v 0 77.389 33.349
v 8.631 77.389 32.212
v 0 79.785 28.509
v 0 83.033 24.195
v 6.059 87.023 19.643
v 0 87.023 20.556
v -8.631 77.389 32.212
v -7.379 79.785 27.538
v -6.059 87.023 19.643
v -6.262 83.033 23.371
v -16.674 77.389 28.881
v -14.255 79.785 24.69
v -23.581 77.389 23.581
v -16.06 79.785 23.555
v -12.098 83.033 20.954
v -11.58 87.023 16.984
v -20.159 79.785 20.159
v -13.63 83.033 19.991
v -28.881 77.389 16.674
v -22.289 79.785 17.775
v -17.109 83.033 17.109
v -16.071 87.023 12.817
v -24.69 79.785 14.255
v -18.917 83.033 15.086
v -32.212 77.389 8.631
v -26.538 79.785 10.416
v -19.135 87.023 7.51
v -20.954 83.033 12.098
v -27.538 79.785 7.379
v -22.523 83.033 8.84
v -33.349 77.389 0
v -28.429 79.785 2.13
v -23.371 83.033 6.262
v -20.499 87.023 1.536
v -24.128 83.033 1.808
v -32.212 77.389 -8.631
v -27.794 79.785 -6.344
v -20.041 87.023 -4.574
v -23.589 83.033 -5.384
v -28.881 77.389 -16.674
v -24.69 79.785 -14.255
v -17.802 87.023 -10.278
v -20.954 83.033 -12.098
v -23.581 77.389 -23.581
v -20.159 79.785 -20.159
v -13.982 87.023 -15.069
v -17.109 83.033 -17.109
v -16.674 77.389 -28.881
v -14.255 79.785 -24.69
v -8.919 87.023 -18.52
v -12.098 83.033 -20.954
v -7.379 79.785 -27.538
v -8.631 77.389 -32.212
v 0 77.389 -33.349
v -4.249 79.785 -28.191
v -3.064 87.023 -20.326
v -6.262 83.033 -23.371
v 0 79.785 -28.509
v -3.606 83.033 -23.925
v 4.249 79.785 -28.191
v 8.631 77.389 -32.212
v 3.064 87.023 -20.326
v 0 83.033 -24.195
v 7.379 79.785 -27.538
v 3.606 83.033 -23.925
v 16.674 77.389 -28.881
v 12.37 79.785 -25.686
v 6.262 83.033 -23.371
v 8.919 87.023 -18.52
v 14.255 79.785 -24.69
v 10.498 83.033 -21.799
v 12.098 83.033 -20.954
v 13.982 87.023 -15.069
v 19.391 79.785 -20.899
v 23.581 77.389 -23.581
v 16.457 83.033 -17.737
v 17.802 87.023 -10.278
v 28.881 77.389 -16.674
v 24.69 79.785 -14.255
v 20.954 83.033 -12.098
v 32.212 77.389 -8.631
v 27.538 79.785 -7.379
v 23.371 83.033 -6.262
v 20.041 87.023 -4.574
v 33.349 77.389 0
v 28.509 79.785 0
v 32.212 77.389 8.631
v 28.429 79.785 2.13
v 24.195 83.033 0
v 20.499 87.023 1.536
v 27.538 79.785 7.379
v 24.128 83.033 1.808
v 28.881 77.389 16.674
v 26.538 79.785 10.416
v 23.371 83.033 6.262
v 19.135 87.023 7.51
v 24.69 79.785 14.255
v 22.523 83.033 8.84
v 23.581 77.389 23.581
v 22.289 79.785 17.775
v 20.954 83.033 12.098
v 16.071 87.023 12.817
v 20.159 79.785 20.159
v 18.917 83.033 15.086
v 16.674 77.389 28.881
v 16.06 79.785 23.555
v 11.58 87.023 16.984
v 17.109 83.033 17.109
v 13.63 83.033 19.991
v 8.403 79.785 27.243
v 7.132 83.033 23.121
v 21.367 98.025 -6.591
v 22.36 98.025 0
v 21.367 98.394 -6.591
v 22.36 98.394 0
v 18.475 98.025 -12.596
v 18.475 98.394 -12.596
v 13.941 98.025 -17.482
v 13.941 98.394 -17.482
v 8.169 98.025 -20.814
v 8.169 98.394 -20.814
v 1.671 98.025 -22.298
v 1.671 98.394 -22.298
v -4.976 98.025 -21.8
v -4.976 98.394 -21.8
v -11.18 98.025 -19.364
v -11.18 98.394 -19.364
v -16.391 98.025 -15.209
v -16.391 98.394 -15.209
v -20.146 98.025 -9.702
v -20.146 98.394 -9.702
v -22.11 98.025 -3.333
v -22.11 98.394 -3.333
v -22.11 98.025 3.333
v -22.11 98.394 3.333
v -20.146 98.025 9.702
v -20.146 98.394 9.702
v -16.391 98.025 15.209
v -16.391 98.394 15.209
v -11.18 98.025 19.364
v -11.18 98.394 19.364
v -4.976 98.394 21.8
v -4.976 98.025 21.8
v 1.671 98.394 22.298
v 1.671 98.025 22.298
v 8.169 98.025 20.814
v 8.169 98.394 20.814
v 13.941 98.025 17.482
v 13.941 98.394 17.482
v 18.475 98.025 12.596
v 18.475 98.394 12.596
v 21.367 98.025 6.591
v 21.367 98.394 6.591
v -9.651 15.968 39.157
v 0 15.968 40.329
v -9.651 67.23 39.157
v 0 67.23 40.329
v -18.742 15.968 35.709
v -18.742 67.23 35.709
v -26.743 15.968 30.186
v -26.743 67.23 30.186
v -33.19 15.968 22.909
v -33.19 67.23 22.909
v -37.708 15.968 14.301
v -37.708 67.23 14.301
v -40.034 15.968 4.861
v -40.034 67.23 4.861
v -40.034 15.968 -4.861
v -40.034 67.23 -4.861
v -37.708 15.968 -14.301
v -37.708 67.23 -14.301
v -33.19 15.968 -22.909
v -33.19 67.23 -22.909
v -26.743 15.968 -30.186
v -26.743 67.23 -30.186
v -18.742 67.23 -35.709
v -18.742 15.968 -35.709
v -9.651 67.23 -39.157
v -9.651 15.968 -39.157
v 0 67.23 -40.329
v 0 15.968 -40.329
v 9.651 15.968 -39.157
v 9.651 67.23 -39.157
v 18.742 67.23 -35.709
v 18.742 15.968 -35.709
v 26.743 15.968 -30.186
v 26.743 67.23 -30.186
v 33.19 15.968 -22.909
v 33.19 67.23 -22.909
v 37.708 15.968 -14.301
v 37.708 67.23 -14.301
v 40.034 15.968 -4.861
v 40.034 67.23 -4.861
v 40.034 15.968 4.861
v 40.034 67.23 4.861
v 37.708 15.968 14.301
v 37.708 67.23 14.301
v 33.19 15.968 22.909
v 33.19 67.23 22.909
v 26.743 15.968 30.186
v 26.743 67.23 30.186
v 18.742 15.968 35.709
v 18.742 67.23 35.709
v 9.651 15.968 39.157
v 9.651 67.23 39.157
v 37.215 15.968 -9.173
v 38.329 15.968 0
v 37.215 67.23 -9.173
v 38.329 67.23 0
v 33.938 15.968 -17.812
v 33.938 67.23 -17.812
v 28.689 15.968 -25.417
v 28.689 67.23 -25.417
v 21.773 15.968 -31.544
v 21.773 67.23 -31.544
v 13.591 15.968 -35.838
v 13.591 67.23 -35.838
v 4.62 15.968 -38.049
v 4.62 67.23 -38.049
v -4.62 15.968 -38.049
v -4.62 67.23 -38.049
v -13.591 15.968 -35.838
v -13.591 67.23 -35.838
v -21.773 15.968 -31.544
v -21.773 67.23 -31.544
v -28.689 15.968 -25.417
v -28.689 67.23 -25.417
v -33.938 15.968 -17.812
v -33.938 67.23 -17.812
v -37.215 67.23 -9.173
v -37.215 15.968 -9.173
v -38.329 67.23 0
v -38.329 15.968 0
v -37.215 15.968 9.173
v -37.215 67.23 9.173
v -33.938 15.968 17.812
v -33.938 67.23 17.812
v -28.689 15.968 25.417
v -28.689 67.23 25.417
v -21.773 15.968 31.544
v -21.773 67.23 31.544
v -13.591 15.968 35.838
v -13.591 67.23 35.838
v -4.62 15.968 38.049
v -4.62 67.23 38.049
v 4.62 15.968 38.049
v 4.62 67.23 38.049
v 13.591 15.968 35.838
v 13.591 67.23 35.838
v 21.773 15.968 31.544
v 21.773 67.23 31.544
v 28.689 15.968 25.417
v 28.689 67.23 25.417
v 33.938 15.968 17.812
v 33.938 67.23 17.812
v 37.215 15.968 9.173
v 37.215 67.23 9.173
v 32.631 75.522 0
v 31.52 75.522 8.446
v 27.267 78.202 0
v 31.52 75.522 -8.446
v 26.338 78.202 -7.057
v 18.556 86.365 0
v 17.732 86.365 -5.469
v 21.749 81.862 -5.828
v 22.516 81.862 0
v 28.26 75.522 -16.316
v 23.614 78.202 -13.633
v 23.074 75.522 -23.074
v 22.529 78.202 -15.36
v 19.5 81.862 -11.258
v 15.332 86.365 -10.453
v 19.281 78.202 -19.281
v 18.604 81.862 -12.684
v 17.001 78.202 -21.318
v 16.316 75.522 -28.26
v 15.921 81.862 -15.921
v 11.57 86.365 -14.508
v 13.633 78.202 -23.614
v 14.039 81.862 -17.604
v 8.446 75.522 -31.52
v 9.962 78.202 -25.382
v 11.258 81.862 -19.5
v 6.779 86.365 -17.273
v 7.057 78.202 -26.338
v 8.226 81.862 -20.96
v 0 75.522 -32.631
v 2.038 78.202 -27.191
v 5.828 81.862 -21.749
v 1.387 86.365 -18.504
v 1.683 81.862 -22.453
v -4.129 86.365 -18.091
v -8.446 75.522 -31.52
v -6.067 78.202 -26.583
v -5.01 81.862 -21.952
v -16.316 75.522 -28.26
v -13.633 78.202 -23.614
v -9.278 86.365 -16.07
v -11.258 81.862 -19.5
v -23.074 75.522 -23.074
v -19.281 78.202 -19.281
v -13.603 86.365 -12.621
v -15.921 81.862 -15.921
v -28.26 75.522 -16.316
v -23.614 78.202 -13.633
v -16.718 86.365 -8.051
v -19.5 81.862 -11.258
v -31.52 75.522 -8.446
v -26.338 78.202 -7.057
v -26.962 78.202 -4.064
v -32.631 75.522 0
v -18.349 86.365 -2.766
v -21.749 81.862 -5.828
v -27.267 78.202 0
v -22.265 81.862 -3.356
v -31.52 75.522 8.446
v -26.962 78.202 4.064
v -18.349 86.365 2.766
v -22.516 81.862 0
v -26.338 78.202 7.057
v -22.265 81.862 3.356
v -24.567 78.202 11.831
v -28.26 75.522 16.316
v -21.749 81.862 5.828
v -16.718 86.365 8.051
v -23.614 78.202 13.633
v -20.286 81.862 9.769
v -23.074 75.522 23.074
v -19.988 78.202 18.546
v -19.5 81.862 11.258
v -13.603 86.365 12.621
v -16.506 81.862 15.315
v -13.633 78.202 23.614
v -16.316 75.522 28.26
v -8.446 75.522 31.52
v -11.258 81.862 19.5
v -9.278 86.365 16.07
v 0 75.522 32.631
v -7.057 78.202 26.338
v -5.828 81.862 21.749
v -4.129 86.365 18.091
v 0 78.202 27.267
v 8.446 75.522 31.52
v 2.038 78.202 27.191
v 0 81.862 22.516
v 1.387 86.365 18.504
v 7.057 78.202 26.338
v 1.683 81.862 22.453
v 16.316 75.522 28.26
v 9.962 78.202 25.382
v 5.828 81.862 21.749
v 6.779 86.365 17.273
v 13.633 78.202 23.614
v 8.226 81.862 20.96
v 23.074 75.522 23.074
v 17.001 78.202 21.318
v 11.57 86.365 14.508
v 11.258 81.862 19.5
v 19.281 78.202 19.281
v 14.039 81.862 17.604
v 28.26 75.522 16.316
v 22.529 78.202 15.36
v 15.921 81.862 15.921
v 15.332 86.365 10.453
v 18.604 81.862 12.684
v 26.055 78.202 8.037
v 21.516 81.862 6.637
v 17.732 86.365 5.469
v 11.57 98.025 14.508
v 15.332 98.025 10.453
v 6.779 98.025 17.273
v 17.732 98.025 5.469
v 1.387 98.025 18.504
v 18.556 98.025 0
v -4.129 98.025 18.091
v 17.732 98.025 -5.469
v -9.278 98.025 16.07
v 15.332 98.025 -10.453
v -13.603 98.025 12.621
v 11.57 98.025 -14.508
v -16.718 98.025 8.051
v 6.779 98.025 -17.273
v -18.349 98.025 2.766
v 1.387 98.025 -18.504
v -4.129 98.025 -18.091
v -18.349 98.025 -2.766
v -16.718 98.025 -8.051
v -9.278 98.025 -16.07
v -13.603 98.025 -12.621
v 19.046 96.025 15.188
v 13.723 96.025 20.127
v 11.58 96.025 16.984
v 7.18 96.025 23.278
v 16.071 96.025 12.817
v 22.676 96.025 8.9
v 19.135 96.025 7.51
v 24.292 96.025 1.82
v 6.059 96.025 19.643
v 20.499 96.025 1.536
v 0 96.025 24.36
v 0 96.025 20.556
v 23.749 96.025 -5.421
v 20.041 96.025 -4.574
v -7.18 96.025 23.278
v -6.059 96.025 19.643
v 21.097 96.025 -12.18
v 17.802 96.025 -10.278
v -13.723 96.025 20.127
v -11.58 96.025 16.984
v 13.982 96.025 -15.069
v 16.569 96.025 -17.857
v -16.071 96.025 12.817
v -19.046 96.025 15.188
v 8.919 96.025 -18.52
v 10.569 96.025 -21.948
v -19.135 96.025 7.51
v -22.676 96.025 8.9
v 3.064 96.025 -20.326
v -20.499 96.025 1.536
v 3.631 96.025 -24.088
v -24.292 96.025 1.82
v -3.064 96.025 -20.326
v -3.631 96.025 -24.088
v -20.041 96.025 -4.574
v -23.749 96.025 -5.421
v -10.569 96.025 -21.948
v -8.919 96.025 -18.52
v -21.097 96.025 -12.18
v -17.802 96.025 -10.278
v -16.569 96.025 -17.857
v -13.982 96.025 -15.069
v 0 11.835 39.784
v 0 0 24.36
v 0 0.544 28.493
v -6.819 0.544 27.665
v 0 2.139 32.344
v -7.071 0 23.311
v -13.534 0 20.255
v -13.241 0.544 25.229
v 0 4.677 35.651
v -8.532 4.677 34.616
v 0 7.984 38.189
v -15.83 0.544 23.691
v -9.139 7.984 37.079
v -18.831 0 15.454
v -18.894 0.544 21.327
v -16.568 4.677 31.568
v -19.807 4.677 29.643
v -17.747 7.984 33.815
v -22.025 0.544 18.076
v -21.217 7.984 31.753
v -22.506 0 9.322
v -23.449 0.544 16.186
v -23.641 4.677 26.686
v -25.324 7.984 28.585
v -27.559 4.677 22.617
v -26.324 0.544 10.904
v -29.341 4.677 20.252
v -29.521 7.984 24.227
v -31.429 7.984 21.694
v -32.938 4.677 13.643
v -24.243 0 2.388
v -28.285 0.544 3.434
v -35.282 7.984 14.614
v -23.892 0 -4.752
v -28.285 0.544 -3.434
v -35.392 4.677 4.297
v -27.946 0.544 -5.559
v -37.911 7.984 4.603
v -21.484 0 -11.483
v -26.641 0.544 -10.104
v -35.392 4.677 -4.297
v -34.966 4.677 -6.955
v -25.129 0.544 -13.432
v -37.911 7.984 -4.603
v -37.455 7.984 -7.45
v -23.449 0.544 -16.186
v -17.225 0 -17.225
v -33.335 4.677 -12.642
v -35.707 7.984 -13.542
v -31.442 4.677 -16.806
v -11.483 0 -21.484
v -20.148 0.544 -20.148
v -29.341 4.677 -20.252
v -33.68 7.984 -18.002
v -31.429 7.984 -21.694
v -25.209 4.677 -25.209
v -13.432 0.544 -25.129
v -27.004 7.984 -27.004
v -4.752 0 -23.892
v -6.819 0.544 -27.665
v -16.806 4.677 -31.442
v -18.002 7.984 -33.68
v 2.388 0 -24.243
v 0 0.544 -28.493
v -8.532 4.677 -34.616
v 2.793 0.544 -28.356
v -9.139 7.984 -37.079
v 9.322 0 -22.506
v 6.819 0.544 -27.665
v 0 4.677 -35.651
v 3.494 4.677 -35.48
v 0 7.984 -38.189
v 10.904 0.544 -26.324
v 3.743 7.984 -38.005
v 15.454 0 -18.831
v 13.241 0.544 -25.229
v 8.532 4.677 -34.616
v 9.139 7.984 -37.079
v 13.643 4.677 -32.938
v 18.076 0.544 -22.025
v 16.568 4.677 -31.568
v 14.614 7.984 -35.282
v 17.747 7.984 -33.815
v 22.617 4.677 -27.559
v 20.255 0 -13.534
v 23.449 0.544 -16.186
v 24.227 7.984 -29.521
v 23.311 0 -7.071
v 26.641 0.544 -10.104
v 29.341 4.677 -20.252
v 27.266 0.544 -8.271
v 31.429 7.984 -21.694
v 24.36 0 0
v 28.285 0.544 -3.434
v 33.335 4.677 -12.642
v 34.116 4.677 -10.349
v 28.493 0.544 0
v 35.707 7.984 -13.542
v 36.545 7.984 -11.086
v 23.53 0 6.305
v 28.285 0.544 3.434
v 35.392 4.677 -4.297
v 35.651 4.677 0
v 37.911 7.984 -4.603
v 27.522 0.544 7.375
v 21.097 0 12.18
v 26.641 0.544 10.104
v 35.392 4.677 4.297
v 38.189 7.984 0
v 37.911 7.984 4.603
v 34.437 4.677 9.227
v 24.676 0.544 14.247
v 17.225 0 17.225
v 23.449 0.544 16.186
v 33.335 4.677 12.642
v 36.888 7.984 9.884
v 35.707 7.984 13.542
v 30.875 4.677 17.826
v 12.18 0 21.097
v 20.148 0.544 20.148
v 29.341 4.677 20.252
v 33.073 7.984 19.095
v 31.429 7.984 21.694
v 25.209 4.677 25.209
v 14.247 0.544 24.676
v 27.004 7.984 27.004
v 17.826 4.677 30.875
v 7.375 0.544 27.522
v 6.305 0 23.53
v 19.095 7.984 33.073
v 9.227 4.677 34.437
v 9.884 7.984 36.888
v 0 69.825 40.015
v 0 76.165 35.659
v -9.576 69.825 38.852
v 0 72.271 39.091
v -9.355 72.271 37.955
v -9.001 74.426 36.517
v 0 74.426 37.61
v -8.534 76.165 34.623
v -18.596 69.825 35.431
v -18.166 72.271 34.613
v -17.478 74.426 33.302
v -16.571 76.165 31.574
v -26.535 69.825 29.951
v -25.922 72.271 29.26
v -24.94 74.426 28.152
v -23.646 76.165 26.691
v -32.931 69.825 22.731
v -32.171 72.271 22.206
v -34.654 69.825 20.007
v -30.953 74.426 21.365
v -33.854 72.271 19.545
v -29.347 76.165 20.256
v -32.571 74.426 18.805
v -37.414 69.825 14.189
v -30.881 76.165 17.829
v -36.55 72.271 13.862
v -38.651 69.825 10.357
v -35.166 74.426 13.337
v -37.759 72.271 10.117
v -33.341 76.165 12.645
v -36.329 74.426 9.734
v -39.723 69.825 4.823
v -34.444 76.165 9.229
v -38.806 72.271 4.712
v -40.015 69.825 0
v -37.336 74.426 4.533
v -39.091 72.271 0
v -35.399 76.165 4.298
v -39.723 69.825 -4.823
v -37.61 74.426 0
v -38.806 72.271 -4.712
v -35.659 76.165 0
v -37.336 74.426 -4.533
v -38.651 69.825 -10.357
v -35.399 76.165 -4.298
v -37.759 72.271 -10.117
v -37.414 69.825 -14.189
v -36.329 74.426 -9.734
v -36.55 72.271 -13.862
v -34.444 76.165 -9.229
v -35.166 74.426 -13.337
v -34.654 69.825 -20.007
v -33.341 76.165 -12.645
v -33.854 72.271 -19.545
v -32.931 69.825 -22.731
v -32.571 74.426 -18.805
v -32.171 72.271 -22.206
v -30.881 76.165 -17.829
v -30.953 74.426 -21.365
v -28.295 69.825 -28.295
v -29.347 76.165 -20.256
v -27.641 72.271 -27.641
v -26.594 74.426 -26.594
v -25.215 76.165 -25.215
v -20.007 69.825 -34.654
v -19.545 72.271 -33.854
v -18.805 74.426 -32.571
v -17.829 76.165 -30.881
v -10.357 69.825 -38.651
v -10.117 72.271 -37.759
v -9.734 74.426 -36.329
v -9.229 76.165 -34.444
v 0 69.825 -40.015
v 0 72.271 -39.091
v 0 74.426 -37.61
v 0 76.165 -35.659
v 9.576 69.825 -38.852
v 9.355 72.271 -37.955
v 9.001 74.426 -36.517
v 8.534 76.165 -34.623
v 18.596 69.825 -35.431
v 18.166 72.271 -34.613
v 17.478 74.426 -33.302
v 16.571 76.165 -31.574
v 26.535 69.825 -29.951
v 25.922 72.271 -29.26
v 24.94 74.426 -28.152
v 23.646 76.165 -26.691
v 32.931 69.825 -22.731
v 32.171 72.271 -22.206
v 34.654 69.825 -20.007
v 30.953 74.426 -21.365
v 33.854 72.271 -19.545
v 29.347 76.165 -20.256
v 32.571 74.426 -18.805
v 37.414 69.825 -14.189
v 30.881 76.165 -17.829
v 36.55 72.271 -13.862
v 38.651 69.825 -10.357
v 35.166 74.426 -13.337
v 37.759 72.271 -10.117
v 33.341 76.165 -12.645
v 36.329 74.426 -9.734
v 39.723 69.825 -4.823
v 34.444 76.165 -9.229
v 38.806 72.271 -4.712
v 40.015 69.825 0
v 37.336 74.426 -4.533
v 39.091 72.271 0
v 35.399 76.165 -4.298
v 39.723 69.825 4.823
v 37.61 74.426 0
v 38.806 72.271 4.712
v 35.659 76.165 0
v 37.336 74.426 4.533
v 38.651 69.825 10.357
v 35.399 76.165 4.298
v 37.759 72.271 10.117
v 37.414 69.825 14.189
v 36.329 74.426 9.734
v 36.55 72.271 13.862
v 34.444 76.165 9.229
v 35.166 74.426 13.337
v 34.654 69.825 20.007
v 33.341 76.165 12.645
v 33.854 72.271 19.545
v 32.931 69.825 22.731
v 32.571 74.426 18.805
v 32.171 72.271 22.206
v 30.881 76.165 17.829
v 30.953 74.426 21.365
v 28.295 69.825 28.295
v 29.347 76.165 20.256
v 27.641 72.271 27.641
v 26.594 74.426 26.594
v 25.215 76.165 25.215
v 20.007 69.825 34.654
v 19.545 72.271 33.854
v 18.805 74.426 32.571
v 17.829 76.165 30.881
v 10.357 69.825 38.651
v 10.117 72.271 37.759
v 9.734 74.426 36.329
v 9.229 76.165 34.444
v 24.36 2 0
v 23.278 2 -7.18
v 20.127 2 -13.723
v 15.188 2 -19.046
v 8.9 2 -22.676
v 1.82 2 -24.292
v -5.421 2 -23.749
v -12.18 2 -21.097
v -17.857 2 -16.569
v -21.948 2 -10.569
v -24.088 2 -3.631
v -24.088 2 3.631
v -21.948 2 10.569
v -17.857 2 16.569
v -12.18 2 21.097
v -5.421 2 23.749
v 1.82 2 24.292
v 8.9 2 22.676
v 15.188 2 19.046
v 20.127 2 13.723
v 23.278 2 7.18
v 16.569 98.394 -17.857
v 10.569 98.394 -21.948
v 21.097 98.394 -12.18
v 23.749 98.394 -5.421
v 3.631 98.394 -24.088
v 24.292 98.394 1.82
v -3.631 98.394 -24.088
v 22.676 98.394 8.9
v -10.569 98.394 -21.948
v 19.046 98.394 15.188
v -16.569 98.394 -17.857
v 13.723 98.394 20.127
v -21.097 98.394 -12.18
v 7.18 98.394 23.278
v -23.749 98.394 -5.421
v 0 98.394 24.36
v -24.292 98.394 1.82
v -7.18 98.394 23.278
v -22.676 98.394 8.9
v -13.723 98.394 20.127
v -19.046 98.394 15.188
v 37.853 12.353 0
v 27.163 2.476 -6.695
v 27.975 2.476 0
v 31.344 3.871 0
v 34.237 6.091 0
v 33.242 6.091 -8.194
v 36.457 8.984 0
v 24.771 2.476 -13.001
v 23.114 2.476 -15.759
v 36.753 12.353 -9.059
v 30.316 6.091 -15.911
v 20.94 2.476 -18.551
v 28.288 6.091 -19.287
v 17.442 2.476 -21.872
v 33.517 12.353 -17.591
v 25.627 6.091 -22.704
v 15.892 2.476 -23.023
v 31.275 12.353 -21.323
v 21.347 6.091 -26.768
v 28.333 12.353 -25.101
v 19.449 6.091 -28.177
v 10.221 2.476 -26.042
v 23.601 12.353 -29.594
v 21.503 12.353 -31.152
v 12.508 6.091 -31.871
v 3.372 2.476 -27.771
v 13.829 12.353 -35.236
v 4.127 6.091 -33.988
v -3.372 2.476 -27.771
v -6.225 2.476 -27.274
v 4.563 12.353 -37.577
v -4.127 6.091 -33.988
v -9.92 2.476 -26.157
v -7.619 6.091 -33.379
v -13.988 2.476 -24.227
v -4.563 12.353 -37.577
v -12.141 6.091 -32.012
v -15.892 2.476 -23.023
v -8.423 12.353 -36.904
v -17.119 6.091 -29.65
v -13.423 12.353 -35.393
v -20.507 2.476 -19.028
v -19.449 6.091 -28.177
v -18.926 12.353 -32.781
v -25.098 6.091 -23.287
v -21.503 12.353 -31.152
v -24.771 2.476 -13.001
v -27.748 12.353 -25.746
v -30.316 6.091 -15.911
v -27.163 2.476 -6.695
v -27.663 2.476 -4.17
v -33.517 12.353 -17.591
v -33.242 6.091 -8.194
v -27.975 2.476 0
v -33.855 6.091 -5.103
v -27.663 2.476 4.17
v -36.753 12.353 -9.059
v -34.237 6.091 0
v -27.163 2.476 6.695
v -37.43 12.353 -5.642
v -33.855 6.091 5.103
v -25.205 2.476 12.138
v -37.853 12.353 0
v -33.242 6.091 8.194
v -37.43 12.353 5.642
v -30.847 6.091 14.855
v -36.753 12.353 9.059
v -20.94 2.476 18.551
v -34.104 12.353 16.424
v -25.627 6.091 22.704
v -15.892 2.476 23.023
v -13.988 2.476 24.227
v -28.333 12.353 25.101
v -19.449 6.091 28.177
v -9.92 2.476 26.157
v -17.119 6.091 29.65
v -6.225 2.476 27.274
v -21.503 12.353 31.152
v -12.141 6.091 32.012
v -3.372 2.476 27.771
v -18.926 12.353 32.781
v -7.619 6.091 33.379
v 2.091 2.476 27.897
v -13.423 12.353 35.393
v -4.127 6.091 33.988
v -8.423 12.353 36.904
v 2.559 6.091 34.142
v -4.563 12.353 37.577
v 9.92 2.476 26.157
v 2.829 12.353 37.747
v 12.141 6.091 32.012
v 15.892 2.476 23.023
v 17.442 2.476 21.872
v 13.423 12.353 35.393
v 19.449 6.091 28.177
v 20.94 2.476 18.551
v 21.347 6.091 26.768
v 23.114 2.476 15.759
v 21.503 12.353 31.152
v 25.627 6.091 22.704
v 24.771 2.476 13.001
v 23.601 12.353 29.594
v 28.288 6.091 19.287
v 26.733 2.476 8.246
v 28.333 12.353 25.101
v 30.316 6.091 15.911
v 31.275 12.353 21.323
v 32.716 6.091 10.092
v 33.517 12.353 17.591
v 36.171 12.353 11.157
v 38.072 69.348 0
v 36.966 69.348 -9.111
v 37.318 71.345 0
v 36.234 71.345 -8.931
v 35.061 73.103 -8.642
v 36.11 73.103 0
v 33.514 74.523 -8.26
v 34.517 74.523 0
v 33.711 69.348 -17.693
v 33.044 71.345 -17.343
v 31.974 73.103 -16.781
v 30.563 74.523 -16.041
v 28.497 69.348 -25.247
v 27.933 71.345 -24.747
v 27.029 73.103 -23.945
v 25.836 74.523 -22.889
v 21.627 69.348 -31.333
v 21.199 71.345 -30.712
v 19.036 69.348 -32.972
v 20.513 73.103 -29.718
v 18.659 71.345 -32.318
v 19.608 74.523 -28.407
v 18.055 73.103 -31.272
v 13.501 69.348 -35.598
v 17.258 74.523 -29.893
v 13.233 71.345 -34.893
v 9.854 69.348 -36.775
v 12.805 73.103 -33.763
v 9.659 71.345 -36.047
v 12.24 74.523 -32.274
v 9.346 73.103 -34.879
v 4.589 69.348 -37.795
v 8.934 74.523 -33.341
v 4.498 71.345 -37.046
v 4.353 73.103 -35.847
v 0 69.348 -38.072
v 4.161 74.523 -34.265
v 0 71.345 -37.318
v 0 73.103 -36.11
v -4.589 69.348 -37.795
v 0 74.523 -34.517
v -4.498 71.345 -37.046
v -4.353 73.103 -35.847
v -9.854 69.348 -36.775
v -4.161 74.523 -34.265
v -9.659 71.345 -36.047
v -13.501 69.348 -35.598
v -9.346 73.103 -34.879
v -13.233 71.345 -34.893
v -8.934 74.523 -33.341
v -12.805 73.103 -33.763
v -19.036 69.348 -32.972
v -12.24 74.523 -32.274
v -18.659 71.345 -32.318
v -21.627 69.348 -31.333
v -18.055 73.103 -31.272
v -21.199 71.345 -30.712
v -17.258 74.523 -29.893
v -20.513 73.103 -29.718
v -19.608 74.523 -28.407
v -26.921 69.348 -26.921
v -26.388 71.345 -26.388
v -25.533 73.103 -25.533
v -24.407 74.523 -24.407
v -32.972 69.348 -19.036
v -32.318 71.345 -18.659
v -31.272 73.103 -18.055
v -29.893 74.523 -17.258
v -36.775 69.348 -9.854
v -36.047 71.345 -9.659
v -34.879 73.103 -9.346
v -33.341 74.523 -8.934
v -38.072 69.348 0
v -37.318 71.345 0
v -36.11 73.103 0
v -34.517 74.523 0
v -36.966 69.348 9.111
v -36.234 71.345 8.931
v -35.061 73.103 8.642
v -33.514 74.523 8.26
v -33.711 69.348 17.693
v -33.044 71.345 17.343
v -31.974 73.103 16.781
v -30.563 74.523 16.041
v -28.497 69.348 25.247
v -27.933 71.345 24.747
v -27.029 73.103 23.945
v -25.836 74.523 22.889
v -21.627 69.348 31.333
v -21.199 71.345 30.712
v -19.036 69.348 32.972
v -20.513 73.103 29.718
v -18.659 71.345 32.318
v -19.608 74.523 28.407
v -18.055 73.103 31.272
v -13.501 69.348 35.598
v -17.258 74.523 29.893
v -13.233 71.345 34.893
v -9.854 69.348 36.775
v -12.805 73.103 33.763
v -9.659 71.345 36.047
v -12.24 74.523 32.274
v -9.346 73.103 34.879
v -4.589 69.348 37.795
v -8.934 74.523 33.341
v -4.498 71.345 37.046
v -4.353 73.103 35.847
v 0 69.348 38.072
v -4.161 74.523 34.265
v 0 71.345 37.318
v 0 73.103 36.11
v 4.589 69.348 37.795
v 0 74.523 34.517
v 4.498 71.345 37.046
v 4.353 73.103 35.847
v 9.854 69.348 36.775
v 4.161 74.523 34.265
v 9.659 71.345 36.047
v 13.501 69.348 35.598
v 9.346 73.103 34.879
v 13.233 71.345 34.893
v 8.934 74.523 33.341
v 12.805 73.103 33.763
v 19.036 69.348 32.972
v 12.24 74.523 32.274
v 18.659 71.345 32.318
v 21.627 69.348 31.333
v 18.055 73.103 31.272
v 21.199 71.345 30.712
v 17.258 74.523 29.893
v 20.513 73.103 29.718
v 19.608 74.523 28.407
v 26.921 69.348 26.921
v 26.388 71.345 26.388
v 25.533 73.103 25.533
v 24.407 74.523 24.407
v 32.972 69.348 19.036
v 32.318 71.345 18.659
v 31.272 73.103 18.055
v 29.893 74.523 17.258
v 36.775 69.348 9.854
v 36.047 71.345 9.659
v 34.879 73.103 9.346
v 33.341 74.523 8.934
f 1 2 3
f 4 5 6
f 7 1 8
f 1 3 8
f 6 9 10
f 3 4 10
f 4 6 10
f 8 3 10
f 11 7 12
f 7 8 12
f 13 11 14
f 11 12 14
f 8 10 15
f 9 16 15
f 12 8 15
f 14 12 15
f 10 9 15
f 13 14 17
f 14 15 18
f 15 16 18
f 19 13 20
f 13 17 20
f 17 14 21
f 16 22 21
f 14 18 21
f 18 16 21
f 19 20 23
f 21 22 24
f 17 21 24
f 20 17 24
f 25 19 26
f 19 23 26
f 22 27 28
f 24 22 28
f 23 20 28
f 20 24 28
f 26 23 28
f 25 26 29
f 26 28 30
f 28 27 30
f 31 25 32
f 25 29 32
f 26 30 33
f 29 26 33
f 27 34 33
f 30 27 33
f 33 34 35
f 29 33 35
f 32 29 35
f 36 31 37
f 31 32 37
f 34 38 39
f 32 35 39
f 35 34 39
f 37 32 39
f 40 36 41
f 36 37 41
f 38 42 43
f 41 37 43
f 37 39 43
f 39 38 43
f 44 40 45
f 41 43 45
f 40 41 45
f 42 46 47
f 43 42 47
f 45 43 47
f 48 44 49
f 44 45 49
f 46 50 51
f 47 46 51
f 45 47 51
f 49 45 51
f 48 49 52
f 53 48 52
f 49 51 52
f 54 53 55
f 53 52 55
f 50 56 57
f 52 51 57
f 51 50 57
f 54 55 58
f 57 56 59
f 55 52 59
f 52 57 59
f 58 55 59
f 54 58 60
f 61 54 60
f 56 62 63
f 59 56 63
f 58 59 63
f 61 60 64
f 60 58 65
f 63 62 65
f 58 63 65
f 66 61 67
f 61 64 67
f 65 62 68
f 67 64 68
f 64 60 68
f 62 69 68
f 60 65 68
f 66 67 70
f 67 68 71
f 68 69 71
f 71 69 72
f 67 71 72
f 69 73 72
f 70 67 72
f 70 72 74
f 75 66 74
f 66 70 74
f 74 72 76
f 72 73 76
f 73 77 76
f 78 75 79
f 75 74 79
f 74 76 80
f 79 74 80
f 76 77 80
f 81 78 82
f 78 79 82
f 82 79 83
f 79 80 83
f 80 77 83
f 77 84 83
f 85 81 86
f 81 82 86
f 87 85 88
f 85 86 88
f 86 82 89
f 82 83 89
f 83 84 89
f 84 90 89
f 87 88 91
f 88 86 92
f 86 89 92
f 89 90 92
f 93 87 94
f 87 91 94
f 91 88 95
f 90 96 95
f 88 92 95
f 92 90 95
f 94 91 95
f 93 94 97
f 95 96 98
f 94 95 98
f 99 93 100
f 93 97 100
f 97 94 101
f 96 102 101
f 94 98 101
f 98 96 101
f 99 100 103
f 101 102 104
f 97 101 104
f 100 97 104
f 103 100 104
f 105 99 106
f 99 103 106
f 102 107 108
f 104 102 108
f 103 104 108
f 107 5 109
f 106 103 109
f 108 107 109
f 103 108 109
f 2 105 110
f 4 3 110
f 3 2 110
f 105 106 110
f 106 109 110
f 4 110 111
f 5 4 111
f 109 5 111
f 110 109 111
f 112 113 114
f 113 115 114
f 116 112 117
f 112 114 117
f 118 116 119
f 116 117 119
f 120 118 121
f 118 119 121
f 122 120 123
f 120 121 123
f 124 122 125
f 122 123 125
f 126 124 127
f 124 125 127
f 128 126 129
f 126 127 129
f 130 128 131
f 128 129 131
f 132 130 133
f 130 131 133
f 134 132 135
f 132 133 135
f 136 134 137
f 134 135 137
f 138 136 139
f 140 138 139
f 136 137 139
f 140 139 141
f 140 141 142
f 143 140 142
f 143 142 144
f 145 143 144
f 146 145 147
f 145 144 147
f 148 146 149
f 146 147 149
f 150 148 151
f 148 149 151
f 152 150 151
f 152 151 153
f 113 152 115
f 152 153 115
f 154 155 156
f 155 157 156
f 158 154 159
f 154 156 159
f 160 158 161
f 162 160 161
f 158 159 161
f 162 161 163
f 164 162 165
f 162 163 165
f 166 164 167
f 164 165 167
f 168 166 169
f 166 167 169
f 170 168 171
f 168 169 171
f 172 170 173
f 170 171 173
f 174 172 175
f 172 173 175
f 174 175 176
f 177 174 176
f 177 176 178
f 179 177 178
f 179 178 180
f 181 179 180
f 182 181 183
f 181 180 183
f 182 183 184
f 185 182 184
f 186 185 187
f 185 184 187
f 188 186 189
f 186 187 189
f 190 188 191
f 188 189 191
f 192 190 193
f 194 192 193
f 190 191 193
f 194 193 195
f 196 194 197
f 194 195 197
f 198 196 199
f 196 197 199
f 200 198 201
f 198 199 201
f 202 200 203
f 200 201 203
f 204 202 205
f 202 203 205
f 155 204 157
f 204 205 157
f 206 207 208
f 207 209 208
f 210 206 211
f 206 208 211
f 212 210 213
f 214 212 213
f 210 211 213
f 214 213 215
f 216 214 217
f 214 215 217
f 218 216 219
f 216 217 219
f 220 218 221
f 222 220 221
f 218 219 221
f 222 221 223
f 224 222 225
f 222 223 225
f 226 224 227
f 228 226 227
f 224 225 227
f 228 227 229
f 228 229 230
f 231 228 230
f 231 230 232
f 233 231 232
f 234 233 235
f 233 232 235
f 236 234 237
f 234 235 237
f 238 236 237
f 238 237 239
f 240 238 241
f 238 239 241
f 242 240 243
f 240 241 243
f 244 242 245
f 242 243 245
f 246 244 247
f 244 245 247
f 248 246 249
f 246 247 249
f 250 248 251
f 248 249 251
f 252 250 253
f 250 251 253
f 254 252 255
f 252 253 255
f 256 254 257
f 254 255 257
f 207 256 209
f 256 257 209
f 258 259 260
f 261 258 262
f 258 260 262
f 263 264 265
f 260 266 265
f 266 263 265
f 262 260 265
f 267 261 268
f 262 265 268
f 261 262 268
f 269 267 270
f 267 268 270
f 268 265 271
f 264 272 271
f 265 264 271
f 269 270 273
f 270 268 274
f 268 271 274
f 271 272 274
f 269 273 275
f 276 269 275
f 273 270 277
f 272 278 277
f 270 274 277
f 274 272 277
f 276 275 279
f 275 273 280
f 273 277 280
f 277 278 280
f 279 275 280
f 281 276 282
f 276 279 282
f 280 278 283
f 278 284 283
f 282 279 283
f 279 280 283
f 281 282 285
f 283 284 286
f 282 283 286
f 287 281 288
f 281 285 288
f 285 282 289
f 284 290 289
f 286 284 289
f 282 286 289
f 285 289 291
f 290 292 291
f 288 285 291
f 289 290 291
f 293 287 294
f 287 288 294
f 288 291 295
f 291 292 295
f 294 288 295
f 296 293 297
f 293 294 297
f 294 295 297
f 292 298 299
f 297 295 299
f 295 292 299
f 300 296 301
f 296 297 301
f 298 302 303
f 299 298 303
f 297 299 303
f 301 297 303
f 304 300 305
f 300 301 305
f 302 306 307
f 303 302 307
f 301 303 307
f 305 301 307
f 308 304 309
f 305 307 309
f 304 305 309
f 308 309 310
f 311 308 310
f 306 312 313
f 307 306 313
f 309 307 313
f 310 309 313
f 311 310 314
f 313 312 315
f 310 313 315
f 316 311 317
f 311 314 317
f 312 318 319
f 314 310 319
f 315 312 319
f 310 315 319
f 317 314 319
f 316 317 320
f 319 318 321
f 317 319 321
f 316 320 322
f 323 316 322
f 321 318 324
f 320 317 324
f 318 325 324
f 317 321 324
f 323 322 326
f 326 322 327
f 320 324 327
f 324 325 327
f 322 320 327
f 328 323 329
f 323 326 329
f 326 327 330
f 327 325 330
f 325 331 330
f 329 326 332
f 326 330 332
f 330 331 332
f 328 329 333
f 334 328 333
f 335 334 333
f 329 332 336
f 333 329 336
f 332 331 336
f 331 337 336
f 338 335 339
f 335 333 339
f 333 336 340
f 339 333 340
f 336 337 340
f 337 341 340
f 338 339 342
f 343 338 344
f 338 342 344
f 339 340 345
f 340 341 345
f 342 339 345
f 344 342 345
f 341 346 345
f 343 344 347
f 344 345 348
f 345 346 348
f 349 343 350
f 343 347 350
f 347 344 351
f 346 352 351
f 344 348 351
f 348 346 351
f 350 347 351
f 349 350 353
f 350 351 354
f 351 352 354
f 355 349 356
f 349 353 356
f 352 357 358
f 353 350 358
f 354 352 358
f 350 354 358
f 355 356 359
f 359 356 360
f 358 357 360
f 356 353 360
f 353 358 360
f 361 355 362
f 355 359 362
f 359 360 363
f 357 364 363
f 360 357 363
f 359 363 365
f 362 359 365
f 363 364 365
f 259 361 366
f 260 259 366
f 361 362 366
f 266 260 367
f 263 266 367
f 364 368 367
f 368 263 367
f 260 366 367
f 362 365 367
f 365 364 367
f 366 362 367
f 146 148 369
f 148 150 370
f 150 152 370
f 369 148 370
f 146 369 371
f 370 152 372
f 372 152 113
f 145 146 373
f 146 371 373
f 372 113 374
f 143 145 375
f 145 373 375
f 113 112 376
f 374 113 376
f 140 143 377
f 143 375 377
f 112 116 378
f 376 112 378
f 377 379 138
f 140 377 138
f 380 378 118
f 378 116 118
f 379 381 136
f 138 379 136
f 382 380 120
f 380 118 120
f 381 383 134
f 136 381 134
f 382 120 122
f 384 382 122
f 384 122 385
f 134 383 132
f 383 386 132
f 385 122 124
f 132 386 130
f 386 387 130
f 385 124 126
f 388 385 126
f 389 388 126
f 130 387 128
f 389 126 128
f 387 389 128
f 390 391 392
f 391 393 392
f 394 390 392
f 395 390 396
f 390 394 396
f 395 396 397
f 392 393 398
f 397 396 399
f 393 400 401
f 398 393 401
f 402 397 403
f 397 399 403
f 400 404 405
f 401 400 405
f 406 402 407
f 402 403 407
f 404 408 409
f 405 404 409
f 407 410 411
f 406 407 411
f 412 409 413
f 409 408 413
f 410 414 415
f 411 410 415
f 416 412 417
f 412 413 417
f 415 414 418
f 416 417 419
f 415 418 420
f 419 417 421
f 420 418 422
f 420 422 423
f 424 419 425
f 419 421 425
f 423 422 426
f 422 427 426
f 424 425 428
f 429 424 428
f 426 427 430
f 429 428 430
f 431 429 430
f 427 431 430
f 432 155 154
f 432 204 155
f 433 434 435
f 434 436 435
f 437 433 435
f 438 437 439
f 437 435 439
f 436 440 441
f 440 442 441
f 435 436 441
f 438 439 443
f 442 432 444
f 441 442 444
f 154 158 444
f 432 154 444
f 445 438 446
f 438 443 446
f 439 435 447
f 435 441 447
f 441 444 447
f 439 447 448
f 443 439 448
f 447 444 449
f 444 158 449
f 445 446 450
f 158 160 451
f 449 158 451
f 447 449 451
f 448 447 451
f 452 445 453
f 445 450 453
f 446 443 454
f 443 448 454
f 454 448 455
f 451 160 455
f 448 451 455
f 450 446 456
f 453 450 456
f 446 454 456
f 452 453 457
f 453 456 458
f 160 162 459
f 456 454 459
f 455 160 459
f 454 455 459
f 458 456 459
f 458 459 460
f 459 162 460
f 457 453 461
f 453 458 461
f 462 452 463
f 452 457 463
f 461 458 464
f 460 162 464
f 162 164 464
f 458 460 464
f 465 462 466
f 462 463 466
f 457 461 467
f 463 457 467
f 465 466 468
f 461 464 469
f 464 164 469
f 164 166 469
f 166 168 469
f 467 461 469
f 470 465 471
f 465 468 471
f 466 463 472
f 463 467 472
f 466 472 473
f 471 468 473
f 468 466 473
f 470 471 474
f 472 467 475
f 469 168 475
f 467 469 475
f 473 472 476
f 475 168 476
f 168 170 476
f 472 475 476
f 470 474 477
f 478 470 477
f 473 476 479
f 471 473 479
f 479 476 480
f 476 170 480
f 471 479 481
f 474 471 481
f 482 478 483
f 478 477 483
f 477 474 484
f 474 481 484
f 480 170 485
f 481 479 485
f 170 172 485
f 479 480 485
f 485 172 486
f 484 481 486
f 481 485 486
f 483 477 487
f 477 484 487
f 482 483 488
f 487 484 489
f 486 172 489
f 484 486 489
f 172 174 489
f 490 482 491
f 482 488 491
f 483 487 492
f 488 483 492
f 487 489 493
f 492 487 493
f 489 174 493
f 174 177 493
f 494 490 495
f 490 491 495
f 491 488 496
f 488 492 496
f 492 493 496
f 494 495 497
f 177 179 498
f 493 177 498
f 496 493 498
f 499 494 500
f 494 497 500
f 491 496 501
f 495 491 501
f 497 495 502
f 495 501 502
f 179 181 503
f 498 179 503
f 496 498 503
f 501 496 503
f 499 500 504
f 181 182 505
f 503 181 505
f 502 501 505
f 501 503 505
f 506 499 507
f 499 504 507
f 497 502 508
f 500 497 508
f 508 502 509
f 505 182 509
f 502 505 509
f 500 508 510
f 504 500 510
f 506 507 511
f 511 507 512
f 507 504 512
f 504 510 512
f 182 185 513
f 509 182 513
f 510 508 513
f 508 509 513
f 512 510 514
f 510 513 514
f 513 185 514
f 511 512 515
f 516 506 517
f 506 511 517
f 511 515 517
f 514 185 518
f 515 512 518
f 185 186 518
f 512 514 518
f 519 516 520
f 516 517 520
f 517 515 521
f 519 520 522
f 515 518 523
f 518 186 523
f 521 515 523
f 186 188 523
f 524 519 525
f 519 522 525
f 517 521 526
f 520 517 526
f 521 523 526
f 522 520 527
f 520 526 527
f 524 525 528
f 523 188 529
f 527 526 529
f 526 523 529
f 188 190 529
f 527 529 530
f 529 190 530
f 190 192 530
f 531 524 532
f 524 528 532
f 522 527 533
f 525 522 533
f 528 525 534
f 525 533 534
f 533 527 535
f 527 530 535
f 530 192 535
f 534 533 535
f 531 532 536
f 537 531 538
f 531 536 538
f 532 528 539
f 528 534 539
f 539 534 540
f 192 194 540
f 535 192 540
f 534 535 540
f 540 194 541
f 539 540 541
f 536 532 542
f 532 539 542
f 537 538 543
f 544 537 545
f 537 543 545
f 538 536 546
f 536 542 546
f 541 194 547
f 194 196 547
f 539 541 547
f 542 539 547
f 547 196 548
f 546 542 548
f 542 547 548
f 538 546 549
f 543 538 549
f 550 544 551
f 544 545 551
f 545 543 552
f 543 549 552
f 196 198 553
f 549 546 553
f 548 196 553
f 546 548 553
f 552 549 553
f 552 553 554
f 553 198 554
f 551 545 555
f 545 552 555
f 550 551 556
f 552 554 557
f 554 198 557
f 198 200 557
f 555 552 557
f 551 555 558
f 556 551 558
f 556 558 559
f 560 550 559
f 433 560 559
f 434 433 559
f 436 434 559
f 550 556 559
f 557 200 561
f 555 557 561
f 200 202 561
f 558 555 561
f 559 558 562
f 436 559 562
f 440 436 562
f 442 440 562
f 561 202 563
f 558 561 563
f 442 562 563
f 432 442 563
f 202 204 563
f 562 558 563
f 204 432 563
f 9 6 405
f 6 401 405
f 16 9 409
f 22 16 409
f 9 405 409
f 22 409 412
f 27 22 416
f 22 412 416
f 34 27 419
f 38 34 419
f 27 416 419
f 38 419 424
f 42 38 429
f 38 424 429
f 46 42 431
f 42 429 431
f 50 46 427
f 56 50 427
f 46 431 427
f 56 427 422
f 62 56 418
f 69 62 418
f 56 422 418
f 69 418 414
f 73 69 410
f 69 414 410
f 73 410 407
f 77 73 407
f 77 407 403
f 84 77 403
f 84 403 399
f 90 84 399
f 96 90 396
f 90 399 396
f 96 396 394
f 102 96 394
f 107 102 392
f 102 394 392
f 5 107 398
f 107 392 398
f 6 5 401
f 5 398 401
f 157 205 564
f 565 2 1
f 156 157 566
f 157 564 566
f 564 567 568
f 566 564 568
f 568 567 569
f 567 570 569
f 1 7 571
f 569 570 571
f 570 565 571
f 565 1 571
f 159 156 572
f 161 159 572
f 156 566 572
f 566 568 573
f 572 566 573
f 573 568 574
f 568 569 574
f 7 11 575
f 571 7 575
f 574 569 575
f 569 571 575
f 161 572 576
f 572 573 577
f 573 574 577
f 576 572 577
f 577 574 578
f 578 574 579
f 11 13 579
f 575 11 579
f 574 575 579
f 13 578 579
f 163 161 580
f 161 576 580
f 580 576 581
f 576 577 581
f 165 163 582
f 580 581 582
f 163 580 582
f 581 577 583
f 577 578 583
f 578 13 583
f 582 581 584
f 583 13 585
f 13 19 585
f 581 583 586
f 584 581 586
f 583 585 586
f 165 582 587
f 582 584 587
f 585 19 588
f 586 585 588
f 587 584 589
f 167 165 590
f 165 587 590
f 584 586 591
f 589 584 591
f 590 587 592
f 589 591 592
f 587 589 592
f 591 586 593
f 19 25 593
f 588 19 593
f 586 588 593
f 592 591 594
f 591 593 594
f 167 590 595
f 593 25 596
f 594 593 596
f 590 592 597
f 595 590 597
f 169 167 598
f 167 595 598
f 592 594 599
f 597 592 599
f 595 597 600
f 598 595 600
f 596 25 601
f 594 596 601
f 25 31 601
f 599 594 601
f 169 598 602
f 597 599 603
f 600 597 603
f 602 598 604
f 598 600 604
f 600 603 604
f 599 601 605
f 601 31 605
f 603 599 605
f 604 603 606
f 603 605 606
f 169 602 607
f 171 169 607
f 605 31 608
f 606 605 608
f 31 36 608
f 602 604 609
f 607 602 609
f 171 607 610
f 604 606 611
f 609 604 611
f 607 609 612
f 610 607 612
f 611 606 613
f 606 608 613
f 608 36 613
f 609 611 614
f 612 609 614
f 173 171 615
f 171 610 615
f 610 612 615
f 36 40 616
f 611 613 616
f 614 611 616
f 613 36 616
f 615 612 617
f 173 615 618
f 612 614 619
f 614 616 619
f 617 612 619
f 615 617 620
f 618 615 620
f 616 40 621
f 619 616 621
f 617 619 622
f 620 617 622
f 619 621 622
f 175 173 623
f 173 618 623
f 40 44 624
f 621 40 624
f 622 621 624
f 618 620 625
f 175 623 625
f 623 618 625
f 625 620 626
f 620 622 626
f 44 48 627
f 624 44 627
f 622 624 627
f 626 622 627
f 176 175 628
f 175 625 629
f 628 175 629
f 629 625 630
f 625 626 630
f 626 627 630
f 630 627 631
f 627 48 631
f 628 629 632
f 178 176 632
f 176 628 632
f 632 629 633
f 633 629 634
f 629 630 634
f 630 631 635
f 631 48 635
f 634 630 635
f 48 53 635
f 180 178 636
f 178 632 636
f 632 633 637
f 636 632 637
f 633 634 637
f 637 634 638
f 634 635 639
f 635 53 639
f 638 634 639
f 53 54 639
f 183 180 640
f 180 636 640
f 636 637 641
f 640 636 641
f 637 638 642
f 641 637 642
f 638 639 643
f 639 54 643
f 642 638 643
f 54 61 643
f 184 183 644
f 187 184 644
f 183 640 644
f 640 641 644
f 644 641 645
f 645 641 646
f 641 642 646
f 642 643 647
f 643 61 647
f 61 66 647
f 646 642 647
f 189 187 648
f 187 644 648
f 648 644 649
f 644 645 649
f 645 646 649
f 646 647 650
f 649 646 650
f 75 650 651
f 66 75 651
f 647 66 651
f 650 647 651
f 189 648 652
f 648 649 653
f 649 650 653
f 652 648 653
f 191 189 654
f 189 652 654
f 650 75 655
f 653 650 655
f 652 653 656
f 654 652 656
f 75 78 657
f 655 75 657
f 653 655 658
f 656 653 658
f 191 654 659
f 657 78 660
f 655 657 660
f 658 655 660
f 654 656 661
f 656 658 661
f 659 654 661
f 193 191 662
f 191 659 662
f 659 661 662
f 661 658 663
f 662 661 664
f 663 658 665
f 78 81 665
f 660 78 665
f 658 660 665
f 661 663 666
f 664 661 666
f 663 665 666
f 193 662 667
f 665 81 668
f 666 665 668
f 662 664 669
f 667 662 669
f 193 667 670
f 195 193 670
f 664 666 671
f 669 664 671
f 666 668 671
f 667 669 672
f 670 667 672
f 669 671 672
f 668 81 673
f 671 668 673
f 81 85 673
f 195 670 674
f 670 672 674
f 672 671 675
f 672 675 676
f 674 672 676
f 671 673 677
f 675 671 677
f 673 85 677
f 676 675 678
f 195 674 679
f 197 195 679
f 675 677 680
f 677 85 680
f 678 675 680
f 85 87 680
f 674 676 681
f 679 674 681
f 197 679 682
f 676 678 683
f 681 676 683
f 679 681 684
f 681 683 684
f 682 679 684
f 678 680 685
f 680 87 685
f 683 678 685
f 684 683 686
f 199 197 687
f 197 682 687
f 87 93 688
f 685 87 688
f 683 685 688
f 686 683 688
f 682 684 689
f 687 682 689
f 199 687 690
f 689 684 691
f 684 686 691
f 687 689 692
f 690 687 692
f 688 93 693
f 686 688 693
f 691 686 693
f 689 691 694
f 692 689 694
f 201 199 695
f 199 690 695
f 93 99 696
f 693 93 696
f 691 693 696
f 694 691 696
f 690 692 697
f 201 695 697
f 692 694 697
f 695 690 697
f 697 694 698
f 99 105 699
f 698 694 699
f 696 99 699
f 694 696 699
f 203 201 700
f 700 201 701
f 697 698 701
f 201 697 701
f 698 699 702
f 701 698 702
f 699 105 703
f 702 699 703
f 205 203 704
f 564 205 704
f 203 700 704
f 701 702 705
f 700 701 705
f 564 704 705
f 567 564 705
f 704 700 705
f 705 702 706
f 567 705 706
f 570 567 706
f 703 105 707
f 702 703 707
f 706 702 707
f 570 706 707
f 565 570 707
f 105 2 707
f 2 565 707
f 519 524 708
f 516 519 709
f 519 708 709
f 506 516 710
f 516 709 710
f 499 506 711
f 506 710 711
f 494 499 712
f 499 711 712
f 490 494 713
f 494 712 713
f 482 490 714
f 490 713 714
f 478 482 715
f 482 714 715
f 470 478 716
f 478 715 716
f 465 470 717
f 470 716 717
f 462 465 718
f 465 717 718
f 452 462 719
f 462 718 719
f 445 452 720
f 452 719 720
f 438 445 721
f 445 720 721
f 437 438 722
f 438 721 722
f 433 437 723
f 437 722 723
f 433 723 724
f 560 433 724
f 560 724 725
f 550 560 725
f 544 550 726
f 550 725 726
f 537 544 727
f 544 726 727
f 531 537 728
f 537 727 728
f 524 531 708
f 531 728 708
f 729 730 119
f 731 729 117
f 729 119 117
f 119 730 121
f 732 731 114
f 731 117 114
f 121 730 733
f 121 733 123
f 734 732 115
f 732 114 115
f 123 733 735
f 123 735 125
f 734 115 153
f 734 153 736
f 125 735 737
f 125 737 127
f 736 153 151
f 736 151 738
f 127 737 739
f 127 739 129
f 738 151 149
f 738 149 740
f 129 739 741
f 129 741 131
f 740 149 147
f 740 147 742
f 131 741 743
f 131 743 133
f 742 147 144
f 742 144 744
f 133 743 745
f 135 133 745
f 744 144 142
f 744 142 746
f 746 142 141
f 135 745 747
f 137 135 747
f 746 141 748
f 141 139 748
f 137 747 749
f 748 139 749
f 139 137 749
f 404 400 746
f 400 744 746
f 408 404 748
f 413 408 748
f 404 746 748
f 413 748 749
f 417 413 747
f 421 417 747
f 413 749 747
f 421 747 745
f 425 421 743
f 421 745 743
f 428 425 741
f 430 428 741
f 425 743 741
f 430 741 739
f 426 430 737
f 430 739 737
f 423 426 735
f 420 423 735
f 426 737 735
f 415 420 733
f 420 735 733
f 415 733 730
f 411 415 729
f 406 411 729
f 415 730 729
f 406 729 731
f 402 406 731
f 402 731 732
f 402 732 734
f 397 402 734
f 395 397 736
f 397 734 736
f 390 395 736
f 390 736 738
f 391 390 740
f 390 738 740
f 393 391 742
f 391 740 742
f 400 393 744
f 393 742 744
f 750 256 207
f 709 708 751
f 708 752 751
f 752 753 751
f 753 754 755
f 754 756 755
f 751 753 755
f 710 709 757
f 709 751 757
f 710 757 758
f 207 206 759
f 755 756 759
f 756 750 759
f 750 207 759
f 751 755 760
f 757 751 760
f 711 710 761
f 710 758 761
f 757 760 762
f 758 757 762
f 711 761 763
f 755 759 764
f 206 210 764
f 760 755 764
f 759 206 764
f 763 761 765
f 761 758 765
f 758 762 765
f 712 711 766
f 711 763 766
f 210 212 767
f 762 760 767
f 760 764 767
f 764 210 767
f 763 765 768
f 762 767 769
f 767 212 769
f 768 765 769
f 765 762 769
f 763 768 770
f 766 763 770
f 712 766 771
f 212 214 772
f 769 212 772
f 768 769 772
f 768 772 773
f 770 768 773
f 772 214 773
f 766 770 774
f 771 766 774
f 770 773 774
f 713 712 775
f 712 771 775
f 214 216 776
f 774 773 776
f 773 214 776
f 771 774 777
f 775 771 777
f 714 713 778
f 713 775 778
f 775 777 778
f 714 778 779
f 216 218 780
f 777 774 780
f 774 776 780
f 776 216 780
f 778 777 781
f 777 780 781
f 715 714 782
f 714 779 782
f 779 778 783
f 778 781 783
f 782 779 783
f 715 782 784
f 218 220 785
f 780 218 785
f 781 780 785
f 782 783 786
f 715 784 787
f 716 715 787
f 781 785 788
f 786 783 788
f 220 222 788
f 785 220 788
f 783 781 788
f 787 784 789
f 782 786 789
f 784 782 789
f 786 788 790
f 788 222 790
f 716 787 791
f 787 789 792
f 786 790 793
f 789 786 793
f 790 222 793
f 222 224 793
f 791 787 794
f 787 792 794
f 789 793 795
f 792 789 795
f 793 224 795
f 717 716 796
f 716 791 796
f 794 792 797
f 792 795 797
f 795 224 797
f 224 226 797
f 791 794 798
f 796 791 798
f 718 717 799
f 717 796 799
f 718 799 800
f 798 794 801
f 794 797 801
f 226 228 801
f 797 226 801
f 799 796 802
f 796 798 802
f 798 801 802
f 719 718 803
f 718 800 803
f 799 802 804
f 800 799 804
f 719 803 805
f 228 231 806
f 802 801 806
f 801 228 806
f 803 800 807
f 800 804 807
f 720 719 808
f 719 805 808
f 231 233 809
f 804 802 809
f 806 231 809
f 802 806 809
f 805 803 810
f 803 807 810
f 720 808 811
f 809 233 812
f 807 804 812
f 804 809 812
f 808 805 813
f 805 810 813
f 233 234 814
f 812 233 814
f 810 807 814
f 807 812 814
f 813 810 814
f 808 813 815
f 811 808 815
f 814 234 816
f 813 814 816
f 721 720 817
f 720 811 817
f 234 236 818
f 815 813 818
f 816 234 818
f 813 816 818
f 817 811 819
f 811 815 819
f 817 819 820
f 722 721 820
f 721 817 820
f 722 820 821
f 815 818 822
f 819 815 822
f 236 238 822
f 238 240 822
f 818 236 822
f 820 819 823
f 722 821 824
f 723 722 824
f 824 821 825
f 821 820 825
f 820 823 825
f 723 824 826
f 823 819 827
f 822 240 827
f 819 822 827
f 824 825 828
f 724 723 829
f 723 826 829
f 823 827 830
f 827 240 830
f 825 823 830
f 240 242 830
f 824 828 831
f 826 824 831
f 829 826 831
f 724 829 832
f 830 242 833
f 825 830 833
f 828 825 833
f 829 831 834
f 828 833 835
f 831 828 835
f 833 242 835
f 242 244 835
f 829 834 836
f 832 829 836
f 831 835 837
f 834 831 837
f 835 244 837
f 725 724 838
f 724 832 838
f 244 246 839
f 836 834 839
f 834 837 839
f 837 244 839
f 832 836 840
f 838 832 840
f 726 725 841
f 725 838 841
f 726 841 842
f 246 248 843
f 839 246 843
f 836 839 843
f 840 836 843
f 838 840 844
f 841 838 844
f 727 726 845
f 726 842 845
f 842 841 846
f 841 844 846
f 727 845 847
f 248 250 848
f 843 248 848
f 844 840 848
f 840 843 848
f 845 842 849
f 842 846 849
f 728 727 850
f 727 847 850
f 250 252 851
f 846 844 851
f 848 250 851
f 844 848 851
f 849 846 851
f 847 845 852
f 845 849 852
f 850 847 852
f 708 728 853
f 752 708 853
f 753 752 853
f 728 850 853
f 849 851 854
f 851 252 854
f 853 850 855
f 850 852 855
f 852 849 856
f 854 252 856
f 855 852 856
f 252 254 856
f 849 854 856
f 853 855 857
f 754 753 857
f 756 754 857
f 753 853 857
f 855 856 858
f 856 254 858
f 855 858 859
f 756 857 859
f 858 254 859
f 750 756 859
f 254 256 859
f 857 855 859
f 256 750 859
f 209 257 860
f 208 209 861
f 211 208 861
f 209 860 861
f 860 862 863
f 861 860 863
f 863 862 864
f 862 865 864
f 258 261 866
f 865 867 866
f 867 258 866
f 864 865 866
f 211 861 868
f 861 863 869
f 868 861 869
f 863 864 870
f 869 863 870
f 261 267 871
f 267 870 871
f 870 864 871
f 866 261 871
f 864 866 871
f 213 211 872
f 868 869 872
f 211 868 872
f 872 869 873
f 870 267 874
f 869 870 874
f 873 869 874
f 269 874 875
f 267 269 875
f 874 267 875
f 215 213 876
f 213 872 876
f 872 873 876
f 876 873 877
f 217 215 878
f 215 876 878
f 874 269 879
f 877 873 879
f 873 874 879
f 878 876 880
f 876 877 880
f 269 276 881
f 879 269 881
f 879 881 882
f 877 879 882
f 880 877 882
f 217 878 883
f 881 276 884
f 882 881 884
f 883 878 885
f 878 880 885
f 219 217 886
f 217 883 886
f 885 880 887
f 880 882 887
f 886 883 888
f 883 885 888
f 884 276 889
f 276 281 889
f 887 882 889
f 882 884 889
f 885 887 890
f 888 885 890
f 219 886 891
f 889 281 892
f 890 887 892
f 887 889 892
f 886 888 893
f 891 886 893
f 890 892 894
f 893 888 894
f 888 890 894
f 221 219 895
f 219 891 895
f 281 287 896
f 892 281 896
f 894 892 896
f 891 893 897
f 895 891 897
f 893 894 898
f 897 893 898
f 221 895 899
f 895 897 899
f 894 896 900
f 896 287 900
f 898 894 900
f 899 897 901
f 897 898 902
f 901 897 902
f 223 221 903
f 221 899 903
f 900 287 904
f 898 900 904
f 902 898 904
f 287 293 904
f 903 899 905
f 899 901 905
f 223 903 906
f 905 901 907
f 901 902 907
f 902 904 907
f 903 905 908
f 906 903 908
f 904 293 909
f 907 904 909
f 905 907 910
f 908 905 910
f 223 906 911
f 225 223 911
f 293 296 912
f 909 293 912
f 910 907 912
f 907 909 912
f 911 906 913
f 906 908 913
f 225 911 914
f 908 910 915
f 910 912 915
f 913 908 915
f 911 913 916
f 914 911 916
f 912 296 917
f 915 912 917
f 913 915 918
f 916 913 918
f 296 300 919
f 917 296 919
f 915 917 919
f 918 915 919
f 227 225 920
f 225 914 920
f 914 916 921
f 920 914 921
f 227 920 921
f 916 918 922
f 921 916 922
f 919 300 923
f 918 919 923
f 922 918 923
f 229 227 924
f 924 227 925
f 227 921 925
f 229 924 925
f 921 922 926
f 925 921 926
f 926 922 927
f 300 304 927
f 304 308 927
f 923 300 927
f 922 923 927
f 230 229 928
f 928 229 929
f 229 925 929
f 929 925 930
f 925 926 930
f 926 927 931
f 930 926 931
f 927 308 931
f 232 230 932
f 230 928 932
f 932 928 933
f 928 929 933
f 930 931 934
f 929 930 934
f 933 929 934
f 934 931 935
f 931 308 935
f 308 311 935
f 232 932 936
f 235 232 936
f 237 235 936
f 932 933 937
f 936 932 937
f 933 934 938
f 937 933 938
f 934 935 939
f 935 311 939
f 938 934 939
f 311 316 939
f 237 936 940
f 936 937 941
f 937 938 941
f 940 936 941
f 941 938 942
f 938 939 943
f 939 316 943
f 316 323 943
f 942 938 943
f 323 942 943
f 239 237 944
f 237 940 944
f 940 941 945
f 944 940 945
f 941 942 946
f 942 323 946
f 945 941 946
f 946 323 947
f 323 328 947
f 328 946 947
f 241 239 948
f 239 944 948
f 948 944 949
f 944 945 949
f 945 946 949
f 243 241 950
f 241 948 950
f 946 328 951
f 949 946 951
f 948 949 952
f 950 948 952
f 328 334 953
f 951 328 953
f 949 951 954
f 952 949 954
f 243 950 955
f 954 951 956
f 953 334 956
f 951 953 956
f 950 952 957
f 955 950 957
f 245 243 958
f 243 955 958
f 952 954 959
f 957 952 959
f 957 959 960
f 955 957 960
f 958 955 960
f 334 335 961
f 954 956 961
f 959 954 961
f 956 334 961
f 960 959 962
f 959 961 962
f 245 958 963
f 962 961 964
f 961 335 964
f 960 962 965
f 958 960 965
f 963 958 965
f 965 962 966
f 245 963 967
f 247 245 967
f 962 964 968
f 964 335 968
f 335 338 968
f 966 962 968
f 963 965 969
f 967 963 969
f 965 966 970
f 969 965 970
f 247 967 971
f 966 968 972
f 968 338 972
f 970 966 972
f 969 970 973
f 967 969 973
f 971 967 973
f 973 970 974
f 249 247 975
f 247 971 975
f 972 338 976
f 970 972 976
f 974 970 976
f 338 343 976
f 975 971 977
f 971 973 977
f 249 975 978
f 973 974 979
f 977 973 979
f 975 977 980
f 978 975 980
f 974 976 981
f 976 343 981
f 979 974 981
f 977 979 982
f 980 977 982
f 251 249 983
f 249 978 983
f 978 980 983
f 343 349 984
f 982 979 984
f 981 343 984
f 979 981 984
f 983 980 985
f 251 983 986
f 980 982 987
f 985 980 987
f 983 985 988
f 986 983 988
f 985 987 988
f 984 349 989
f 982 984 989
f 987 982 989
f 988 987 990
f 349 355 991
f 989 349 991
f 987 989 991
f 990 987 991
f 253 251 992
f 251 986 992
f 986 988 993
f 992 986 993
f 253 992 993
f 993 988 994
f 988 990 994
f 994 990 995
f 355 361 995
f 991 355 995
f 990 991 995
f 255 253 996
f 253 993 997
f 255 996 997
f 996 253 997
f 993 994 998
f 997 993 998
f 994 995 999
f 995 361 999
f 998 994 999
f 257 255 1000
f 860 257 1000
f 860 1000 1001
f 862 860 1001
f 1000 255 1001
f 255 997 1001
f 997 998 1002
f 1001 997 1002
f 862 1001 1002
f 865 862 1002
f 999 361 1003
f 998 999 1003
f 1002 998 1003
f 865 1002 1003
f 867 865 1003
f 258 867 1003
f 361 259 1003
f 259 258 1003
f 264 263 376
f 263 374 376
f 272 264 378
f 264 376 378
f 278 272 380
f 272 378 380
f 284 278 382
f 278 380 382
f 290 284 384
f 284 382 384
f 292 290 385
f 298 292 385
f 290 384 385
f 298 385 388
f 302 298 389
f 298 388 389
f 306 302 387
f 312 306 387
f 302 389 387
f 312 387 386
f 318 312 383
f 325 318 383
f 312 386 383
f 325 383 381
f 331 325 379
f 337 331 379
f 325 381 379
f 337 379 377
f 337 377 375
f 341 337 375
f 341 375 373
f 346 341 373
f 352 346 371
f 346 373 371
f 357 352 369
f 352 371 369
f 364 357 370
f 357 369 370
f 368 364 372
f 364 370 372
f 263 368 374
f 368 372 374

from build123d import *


# Read off the part's stored shape, not the designer's step: Shell1
with BuildPart() as part:
    # Sketch1 → Revolve1 (revolve)
    with BuildSketch(Plane.XY, mode=Mode.PRIVATE) as revolve1_sk:
        with BuildLine():
            Line((0, 0), (24.360145845, 0))
            ThreePointArc((24.360145845, 0), (35.651483834, 4.677025332), (40.328509165, 15.96836332))
            Line((40.328509165, 15.96836332), (40.328509165, 67.23016629))
            ThreePointArc((40.328509165, 67.23016629), (38.415383352, 73.392914659), (33.348649325, 77.388878138))
            ThreePointArc((33.348649325, 77.388878138), (26.276782154, 81.308753559), (20.55607493, 87.022792188))
            Line((20.55607493, 87.022792188), (20.55607493, 96.024974169))
            Line((20.55607493, 96.024974169), (24.360145845, 96.024974169))
            Line((24.360145845, 96.024974169), (24.360145845, 98.393969428))
            Line((24.360145845, 98.393969428), (0, 98.393969428))
            Line((0, 98.393969428), (0, 0))
        make_face()
    revolve(revolve1_sk.sketch.rotate(Axis((0, 98.393969428, 0), (0, -1, 0)), 90), axis=Axis((0, 98.393969428, 0), (0, -1, 0)))

    # Shell1 outline → Shell1 (revolve, cut)
    with BuildSketch(Plane.XY):
        with BuildLine():
            Line((24.360145845, 0), (24.360145845, 2))
            ThreePointArc((24.360145845, 2), (34.237270271, 6.091238894), (38.328509165, 15.96836332))
            Line((38.328509165, 15.96836332), (38.328509165, 67.23016629))
            ThreePointArc((38.328509165, 67.23016629), (36.766977277, 72.260325849), (32.631406737, 75.521911864))
            ThreePointArc((32.631406737, 75.521911864), (24.803132334, 79.91715704), (18.55607493, 86.364973266))
            Line((18.55607493, 86.364973266), (18.55607493, 98.024974169))
            Line((18.55607493, 98.024974169), (22.360145845, 98.024974169))
            Line((22.360145845, 98.024974169), (22.360145845, 98.393969428))
            Line((22.360145845, 98.393969428), (0, 98.393969428))
            Line((0, 98.393969428), (0, 0))
            Line((0, 0), (24.360145845, 0))
        make_face()
    revolve(axis=Axis((0, 0, 0), (0, 1, 0)), mode=Mode.SUBTRACT)


solid = part.part
